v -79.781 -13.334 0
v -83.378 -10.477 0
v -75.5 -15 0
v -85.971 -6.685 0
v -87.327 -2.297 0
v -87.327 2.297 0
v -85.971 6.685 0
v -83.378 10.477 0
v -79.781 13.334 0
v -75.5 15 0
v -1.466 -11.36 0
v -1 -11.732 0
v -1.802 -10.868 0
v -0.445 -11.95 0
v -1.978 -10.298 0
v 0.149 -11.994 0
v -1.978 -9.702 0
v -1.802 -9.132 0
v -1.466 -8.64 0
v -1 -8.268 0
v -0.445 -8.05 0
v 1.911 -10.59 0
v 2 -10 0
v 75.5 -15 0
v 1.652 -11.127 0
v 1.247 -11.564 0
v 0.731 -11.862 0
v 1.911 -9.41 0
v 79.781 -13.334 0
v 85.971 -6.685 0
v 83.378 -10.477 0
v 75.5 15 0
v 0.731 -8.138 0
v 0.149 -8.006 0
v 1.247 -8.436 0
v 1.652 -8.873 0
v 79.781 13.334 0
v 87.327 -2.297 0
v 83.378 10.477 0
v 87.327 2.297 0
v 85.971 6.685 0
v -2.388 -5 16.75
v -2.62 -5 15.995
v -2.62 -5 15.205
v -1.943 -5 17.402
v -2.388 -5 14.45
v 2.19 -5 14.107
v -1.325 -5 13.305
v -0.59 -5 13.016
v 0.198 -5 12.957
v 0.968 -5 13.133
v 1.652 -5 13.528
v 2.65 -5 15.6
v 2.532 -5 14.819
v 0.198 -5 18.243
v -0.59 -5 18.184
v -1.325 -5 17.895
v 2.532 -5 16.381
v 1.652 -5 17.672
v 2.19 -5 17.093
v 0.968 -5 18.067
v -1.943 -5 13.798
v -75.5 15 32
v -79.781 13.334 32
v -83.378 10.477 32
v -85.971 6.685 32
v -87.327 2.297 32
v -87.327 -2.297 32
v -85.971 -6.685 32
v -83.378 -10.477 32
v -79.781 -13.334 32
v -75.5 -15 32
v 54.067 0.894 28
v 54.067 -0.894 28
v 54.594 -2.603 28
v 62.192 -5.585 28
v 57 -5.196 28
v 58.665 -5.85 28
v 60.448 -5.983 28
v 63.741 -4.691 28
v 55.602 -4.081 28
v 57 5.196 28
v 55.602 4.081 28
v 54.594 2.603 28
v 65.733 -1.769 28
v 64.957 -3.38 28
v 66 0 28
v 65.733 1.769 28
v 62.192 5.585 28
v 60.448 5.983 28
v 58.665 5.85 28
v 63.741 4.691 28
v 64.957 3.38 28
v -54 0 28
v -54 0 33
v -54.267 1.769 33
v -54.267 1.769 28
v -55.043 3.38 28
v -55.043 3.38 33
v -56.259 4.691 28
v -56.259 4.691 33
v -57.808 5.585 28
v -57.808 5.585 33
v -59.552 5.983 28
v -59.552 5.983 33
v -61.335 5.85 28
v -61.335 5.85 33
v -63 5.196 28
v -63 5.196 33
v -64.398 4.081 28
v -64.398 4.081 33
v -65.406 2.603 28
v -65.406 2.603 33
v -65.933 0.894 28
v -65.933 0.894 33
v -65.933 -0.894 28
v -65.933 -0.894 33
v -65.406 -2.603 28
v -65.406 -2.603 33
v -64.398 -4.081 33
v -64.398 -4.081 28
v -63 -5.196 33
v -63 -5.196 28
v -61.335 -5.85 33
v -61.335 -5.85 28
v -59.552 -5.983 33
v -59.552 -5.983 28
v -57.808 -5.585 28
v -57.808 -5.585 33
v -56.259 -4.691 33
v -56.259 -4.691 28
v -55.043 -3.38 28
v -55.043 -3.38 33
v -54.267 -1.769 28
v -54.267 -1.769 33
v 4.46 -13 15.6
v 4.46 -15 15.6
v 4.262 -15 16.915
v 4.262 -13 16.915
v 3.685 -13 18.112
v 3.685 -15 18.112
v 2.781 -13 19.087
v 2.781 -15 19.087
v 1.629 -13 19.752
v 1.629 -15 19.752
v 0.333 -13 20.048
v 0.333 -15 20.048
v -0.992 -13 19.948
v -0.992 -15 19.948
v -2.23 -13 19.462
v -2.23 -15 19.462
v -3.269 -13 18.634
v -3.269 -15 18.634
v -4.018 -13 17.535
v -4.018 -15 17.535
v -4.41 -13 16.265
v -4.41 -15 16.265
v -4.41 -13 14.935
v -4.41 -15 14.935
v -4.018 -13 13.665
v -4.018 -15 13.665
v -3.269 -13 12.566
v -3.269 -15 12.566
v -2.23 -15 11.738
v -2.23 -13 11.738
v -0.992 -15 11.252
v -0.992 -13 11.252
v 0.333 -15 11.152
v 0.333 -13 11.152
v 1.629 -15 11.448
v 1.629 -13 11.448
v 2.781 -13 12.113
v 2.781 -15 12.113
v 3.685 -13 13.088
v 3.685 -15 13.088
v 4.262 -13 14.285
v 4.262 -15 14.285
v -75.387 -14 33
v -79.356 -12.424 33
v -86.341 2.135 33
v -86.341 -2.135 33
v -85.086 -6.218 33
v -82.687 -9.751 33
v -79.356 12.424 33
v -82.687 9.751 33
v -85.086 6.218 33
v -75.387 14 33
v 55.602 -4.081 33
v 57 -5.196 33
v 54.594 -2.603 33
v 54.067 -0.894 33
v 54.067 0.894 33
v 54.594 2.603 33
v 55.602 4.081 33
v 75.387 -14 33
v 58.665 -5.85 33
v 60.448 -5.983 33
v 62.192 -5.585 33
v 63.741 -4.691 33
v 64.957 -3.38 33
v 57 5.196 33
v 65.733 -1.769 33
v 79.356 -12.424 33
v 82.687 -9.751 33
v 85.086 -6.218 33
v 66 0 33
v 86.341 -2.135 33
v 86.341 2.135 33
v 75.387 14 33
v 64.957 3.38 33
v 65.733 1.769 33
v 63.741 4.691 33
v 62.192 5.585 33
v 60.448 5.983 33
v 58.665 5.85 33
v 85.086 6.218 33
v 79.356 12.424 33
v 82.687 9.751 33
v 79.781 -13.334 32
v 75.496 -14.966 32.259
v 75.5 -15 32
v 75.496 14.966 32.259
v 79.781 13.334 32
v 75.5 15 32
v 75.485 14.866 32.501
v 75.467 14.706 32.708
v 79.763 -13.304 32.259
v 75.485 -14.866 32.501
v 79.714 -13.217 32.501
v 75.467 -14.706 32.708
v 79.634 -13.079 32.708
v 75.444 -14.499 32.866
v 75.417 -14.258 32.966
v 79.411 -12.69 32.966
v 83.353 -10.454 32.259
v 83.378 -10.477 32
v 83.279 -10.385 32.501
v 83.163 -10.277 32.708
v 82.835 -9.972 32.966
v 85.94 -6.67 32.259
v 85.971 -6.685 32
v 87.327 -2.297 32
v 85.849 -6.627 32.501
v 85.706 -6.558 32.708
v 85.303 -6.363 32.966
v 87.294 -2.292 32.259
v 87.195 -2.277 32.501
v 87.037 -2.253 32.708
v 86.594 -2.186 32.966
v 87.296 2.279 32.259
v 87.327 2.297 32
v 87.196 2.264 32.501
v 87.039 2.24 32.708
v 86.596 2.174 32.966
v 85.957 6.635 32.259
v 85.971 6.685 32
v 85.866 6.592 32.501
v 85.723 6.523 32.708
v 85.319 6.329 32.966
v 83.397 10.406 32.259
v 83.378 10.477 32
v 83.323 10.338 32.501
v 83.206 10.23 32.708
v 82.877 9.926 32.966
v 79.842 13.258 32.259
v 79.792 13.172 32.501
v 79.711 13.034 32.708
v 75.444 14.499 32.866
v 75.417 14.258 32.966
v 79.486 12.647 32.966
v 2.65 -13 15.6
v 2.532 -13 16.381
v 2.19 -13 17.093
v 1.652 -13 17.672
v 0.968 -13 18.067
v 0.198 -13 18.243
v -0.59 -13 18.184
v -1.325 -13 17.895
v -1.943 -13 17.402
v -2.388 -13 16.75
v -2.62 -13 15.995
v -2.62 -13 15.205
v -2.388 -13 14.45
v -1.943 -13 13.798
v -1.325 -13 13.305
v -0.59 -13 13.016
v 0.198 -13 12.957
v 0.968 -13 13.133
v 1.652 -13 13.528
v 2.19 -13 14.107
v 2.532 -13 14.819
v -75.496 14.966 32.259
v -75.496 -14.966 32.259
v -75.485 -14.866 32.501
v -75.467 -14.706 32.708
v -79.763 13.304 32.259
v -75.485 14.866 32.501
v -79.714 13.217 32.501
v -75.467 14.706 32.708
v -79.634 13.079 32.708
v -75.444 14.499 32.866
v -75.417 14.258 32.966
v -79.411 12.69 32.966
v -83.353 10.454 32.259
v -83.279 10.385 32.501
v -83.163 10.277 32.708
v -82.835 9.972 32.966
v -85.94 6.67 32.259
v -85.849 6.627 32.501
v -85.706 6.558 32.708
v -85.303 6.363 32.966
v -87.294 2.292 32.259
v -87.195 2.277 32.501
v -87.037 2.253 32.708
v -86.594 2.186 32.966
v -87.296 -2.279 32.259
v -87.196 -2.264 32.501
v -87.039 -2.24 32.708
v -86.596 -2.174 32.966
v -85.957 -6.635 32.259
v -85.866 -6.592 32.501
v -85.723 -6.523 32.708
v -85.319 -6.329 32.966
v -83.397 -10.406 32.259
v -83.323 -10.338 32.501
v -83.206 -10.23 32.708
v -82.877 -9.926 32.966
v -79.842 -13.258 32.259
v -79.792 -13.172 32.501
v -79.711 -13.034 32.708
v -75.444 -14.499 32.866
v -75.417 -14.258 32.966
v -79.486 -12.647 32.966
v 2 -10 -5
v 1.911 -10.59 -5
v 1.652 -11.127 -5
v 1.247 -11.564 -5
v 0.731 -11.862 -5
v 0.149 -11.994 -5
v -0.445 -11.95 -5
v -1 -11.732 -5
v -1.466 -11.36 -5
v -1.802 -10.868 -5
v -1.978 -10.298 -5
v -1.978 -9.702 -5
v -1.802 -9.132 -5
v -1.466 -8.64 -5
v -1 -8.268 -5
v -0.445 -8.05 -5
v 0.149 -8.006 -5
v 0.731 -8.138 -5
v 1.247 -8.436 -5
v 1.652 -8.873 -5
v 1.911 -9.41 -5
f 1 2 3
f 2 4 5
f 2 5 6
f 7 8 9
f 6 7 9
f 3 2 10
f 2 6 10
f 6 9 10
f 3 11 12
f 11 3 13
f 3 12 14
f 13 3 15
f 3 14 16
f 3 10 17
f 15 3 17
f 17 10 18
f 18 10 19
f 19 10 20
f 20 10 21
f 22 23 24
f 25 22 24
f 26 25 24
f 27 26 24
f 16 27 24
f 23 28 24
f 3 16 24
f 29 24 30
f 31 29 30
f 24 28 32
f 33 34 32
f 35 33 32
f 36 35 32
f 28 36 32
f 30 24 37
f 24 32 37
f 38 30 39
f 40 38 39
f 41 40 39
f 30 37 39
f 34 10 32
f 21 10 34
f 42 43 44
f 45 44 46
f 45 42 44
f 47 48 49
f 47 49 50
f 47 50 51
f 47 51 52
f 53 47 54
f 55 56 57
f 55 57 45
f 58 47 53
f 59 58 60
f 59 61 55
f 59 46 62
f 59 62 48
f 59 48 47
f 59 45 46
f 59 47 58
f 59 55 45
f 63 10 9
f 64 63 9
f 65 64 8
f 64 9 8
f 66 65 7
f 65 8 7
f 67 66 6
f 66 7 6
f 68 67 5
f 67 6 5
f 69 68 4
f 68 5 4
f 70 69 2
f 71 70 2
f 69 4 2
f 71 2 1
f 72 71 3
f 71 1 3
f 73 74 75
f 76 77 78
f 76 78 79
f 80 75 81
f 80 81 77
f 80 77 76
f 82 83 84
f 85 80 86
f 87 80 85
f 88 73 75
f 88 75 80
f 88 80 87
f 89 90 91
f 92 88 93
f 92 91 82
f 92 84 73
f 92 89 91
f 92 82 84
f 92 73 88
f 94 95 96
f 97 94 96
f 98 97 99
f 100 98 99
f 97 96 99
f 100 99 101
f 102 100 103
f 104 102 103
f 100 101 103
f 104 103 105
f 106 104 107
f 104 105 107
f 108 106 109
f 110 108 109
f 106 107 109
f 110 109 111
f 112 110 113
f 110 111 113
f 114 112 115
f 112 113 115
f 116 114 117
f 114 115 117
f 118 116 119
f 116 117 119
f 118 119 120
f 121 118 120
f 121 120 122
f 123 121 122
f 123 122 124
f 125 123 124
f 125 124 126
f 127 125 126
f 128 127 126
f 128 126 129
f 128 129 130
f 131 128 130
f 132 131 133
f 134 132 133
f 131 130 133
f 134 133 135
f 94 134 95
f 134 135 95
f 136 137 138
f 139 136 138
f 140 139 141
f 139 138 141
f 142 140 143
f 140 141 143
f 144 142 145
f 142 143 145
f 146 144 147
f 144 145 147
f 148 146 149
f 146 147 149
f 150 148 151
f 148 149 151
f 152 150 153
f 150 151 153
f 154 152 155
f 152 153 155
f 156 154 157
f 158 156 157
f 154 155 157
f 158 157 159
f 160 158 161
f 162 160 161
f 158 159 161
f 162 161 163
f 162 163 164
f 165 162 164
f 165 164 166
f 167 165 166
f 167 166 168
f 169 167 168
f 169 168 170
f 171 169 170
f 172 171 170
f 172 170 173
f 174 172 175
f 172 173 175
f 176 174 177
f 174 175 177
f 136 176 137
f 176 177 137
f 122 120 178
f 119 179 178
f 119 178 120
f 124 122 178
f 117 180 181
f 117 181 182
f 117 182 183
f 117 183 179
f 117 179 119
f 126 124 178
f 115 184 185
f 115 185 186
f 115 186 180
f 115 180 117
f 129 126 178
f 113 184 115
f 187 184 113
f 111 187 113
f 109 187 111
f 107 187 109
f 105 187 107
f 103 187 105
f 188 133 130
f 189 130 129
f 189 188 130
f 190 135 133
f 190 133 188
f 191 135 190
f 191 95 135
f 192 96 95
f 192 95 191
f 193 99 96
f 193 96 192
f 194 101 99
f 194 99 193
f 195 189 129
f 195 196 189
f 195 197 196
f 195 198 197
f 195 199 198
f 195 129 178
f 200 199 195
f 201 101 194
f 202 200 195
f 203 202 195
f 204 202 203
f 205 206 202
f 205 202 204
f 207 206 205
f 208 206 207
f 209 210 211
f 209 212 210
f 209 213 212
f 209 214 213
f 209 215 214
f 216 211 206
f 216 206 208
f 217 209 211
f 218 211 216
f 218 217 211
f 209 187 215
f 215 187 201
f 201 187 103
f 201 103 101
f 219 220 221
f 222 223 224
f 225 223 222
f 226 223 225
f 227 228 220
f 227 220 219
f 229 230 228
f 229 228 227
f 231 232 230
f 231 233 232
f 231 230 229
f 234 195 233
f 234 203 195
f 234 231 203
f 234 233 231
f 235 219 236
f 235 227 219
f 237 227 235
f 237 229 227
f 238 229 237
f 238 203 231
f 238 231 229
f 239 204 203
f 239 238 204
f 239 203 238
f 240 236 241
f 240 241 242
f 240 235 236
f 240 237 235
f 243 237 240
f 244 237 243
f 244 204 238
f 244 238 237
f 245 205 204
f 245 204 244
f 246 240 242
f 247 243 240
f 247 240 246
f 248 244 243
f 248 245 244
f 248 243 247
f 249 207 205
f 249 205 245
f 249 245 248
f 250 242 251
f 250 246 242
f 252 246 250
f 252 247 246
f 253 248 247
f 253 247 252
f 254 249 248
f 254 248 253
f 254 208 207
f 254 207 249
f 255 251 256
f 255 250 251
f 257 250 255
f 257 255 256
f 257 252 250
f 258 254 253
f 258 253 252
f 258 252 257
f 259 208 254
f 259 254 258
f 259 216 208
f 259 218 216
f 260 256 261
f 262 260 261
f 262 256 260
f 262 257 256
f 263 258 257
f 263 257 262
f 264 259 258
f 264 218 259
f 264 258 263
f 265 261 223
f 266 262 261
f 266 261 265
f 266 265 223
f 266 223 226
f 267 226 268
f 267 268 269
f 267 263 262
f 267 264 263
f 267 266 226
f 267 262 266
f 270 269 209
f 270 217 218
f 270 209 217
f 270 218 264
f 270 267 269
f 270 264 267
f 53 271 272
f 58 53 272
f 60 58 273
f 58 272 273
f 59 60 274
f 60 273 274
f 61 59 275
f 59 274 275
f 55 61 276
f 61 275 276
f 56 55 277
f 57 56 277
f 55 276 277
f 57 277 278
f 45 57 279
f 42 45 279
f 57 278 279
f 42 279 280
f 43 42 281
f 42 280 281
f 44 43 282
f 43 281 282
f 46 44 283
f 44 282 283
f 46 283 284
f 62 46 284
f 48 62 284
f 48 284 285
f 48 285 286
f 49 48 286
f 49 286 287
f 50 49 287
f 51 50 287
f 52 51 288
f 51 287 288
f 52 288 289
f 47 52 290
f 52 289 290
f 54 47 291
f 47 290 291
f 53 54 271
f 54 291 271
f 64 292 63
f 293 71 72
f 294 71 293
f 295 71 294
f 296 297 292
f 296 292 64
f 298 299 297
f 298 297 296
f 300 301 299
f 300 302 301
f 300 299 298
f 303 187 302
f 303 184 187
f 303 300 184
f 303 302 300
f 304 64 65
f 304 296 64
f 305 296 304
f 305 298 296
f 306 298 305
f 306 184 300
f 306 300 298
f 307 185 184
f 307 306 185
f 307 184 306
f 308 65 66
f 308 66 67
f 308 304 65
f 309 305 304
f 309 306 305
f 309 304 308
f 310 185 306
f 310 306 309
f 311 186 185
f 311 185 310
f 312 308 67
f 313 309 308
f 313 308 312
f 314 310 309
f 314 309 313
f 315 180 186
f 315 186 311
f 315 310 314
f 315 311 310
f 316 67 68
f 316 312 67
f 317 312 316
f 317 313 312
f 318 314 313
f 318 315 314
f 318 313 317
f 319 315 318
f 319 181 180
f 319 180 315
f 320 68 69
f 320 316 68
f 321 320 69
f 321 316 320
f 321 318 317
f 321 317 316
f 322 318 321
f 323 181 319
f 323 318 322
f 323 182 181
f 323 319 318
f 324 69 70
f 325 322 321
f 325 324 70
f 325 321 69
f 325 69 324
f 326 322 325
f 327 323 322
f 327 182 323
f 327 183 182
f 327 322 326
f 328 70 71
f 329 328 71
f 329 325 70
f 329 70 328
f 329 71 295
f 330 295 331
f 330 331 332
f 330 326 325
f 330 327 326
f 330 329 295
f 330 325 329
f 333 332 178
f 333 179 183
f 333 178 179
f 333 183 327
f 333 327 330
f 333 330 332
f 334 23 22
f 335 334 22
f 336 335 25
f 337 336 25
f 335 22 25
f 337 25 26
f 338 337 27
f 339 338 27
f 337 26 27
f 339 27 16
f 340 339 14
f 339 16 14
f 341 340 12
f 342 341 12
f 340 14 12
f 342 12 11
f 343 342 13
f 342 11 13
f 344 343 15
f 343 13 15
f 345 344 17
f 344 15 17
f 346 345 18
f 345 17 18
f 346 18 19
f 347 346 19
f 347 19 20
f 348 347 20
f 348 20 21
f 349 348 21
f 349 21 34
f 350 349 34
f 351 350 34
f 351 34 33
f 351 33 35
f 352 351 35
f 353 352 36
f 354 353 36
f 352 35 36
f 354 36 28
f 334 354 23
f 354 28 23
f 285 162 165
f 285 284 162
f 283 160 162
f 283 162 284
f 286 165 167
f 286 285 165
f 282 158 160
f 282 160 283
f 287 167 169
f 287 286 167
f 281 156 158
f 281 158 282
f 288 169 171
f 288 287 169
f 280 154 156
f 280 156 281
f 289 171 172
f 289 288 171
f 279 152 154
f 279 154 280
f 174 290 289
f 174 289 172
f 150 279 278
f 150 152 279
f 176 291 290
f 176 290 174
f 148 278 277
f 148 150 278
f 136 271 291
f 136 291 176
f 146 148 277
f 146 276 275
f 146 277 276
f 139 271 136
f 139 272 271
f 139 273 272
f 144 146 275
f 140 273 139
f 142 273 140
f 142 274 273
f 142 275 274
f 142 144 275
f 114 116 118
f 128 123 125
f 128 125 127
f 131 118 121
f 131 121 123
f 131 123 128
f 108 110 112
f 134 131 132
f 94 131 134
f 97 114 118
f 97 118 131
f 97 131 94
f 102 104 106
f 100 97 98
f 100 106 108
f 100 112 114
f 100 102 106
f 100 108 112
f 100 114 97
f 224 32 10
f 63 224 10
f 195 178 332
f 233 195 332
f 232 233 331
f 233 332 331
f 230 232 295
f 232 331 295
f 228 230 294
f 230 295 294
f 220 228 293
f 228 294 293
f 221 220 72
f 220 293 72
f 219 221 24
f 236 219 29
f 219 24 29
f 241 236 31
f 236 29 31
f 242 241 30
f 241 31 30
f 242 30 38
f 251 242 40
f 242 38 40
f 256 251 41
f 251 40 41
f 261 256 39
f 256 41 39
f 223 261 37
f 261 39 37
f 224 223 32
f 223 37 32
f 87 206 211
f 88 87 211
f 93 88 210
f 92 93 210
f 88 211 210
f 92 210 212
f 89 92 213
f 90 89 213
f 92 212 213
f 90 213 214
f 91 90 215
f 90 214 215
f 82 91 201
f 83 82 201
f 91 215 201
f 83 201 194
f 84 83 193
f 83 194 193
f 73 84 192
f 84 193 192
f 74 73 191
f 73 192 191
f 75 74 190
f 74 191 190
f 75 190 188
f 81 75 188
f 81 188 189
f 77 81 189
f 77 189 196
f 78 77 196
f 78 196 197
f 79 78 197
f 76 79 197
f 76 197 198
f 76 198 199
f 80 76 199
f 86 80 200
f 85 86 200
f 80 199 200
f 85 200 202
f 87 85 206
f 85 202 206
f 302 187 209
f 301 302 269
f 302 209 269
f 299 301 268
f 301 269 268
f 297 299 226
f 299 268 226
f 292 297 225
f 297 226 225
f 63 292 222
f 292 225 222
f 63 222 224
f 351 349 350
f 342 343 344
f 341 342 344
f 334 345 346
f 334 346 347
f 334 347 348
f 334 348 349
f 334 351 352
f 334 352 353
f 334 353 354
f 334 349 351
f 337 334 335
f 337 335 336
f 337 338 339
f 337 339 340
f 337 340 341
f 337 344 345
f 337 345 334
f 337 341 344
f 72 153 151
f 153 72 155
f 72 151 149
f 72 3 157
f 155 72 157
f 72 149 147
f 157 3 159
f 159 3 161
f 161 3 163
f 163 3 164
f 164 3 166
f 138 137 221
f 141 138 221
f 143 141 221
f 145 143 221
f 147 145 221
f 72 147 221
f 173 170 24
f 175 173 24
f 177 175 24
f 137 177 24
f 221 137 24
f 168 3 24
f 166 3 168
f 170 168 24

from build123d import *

# Parameters (mm, degrees)
ESTRUSIONE_ESTRUSIONE1_DEPTH = 33
RACCORDO1_R                  = 1
SCHIZZO2_R                   = 6
TAGLIO_ESTRUSIONE1_DEPTH     = 5
SCHIZZO3_R                   = 4.46
TAGLIO_ESTRUSIONE2_DEPTH     = 2
SCHIZZO4_R                   = 2.65
TAGLIO_ESTRUSIONE3_DEPTH     = 8
SCHIZZO5_R                   = 2
ESTRUSIONE_ESTRUSIONE2_DEPTH = 5


with BuildPart() as part:
    # Schizzo1 → Estrusione-Estrusione1 (new body)
    with BuildSketch(Plane.XY):
        with BuildLine():
            Line((-75.5, -15), (75.5, -15))
            ThreePointArc((75.5, -15), (87.5, 0), (75.5, 15))
            Line((75.5, 15), (-75.5, 15))
            ThreePointArc((-75.5, 15), (-87.5, 0), (-75.5, -15))
        make_face()
    extrude(amount=ESTRUSIONE_ESTRUSIONE1_DEPTH)

    # Raccordo1
    # the kernel refuses this fillet: 1 mm, written as the material it takes off along each edge
    with BuildSketch(Plane(origin=(72.125, 0, 33), x_dir=(0.05848647839975847, -0.9982882007939364, 0), z_dir=(-0.9982882007939364, -0.05848647839975847, 0))) as raccordo1_piece_1:
        with BuildLine():
            CenterArc((15.375 - RACCORDO1_R, -RACCORDO1_R), RACCORDO1_R, 0, 90)
            Line((15.375 - RACCORDO1_R, 0), (15.375, 0))
            Line((15.375, 0), (15.375, -RACCORDO1_R))
        make_face()
    revolve(axis=Axis((72.125, 0, 33), (0, 0, 1)), revolution_arc=173.294116446, mode=Mode.SUBTRACT)
    with BuildSketch(Plane(origin=(78, 15, 33), x_dir=(0, 0, -1), z_dir=(-1, 0, 0)), Plane(origin=(-78, -15, 33), x_dir=(0, 0, -1), z_dir=(1, 0, 0))) as raccordo1_piece_2:
        with BuildLine():
            CenterArc((RACCORDO1_R, RACCORDO1_R), RACCORDO1_R, 180, 90)
            Line((0, RACCORDO1_R), (0, 0))
            Line((0, 0), (RACCORDO1_R, 0))
        make_face()
    extrude(amount=156, mode=Mode.SUBTRACT)
    with BuildSketch(Plane(origin=(-72.125, 0, 33), x_dir=(-0.05848647839975752, 0.9982882007939364, 0), z_dir=(0.9982882007939364, 0.05848647839975752, 0))) as raccordo1_piece_3:
        with BuildLine():
            CenterArc((15.375 - RACCORDO1_R, -RACCORDO1_R), RACCORDO1_R, 0, 90)
            Line((15.375 - RACCORDO1_R, 0), (15.375, 0))
            Line((15.375, 0), (15.375, -RACCORDO1_R))
        make_face()
    revolve(axis=Axis((-72.125, 0, 33), (0, 0, 1)), revolution_arc=173.294116446, mode=Mode.SUBTRACT)

    # Schizzo2 → Taglio-Estrusione1 (cut)
    with BuildSketch(Plane.XY.offset(33)):
        with Locations((-60, 0)):
            Circle(SCHIZZO2_R)
        with Locations((60, 0)):
            Circle(SCHIZZO2_R)
    extrude(amount=-TAGLIO_ESTRUSIONE1_DEPTH, mode=Mode.SUBTRACT)

    # Schizzo3 → Taglio-Estrusione2 (cut)
    with BuildSketch(Plane.XZ.offset(15)):
        with Locations((0, 15.6)):
            Circle(SCHIZZO3_R)
    extrude(amount=-TAGLIO_ESTRUSIONE2_DEPTH, mode=Mode.SUBTRACT)

    # Schizzo4 → Taglio-Estrusione3 (cut)
    with BuildSketch(Plane.XZ.offset(13)):
        with Locations((0, 15.6)):
            Circle(SCHIZZO4_R)
    extrude(amount=-TAGLIO_ESTRUSIONE3_DEPTH, mode=Mode.SUBTRACT)

    # Schizzo5 → Estrusione-Estrusione2 (add)
    with BuildSketch(Plane(origin=(0, 0, 0), x_dir=(-1, 0, 0), z_dir=(0, 0, -1))):
        with Locations(Location((0, -10, 0), (0, 0, 180))):
            Circle(SCHIZZO5_R)
    extrude(amount=ESTRUSIONE_ESTRUSIONE2_DEPTH)


solid = part.part
